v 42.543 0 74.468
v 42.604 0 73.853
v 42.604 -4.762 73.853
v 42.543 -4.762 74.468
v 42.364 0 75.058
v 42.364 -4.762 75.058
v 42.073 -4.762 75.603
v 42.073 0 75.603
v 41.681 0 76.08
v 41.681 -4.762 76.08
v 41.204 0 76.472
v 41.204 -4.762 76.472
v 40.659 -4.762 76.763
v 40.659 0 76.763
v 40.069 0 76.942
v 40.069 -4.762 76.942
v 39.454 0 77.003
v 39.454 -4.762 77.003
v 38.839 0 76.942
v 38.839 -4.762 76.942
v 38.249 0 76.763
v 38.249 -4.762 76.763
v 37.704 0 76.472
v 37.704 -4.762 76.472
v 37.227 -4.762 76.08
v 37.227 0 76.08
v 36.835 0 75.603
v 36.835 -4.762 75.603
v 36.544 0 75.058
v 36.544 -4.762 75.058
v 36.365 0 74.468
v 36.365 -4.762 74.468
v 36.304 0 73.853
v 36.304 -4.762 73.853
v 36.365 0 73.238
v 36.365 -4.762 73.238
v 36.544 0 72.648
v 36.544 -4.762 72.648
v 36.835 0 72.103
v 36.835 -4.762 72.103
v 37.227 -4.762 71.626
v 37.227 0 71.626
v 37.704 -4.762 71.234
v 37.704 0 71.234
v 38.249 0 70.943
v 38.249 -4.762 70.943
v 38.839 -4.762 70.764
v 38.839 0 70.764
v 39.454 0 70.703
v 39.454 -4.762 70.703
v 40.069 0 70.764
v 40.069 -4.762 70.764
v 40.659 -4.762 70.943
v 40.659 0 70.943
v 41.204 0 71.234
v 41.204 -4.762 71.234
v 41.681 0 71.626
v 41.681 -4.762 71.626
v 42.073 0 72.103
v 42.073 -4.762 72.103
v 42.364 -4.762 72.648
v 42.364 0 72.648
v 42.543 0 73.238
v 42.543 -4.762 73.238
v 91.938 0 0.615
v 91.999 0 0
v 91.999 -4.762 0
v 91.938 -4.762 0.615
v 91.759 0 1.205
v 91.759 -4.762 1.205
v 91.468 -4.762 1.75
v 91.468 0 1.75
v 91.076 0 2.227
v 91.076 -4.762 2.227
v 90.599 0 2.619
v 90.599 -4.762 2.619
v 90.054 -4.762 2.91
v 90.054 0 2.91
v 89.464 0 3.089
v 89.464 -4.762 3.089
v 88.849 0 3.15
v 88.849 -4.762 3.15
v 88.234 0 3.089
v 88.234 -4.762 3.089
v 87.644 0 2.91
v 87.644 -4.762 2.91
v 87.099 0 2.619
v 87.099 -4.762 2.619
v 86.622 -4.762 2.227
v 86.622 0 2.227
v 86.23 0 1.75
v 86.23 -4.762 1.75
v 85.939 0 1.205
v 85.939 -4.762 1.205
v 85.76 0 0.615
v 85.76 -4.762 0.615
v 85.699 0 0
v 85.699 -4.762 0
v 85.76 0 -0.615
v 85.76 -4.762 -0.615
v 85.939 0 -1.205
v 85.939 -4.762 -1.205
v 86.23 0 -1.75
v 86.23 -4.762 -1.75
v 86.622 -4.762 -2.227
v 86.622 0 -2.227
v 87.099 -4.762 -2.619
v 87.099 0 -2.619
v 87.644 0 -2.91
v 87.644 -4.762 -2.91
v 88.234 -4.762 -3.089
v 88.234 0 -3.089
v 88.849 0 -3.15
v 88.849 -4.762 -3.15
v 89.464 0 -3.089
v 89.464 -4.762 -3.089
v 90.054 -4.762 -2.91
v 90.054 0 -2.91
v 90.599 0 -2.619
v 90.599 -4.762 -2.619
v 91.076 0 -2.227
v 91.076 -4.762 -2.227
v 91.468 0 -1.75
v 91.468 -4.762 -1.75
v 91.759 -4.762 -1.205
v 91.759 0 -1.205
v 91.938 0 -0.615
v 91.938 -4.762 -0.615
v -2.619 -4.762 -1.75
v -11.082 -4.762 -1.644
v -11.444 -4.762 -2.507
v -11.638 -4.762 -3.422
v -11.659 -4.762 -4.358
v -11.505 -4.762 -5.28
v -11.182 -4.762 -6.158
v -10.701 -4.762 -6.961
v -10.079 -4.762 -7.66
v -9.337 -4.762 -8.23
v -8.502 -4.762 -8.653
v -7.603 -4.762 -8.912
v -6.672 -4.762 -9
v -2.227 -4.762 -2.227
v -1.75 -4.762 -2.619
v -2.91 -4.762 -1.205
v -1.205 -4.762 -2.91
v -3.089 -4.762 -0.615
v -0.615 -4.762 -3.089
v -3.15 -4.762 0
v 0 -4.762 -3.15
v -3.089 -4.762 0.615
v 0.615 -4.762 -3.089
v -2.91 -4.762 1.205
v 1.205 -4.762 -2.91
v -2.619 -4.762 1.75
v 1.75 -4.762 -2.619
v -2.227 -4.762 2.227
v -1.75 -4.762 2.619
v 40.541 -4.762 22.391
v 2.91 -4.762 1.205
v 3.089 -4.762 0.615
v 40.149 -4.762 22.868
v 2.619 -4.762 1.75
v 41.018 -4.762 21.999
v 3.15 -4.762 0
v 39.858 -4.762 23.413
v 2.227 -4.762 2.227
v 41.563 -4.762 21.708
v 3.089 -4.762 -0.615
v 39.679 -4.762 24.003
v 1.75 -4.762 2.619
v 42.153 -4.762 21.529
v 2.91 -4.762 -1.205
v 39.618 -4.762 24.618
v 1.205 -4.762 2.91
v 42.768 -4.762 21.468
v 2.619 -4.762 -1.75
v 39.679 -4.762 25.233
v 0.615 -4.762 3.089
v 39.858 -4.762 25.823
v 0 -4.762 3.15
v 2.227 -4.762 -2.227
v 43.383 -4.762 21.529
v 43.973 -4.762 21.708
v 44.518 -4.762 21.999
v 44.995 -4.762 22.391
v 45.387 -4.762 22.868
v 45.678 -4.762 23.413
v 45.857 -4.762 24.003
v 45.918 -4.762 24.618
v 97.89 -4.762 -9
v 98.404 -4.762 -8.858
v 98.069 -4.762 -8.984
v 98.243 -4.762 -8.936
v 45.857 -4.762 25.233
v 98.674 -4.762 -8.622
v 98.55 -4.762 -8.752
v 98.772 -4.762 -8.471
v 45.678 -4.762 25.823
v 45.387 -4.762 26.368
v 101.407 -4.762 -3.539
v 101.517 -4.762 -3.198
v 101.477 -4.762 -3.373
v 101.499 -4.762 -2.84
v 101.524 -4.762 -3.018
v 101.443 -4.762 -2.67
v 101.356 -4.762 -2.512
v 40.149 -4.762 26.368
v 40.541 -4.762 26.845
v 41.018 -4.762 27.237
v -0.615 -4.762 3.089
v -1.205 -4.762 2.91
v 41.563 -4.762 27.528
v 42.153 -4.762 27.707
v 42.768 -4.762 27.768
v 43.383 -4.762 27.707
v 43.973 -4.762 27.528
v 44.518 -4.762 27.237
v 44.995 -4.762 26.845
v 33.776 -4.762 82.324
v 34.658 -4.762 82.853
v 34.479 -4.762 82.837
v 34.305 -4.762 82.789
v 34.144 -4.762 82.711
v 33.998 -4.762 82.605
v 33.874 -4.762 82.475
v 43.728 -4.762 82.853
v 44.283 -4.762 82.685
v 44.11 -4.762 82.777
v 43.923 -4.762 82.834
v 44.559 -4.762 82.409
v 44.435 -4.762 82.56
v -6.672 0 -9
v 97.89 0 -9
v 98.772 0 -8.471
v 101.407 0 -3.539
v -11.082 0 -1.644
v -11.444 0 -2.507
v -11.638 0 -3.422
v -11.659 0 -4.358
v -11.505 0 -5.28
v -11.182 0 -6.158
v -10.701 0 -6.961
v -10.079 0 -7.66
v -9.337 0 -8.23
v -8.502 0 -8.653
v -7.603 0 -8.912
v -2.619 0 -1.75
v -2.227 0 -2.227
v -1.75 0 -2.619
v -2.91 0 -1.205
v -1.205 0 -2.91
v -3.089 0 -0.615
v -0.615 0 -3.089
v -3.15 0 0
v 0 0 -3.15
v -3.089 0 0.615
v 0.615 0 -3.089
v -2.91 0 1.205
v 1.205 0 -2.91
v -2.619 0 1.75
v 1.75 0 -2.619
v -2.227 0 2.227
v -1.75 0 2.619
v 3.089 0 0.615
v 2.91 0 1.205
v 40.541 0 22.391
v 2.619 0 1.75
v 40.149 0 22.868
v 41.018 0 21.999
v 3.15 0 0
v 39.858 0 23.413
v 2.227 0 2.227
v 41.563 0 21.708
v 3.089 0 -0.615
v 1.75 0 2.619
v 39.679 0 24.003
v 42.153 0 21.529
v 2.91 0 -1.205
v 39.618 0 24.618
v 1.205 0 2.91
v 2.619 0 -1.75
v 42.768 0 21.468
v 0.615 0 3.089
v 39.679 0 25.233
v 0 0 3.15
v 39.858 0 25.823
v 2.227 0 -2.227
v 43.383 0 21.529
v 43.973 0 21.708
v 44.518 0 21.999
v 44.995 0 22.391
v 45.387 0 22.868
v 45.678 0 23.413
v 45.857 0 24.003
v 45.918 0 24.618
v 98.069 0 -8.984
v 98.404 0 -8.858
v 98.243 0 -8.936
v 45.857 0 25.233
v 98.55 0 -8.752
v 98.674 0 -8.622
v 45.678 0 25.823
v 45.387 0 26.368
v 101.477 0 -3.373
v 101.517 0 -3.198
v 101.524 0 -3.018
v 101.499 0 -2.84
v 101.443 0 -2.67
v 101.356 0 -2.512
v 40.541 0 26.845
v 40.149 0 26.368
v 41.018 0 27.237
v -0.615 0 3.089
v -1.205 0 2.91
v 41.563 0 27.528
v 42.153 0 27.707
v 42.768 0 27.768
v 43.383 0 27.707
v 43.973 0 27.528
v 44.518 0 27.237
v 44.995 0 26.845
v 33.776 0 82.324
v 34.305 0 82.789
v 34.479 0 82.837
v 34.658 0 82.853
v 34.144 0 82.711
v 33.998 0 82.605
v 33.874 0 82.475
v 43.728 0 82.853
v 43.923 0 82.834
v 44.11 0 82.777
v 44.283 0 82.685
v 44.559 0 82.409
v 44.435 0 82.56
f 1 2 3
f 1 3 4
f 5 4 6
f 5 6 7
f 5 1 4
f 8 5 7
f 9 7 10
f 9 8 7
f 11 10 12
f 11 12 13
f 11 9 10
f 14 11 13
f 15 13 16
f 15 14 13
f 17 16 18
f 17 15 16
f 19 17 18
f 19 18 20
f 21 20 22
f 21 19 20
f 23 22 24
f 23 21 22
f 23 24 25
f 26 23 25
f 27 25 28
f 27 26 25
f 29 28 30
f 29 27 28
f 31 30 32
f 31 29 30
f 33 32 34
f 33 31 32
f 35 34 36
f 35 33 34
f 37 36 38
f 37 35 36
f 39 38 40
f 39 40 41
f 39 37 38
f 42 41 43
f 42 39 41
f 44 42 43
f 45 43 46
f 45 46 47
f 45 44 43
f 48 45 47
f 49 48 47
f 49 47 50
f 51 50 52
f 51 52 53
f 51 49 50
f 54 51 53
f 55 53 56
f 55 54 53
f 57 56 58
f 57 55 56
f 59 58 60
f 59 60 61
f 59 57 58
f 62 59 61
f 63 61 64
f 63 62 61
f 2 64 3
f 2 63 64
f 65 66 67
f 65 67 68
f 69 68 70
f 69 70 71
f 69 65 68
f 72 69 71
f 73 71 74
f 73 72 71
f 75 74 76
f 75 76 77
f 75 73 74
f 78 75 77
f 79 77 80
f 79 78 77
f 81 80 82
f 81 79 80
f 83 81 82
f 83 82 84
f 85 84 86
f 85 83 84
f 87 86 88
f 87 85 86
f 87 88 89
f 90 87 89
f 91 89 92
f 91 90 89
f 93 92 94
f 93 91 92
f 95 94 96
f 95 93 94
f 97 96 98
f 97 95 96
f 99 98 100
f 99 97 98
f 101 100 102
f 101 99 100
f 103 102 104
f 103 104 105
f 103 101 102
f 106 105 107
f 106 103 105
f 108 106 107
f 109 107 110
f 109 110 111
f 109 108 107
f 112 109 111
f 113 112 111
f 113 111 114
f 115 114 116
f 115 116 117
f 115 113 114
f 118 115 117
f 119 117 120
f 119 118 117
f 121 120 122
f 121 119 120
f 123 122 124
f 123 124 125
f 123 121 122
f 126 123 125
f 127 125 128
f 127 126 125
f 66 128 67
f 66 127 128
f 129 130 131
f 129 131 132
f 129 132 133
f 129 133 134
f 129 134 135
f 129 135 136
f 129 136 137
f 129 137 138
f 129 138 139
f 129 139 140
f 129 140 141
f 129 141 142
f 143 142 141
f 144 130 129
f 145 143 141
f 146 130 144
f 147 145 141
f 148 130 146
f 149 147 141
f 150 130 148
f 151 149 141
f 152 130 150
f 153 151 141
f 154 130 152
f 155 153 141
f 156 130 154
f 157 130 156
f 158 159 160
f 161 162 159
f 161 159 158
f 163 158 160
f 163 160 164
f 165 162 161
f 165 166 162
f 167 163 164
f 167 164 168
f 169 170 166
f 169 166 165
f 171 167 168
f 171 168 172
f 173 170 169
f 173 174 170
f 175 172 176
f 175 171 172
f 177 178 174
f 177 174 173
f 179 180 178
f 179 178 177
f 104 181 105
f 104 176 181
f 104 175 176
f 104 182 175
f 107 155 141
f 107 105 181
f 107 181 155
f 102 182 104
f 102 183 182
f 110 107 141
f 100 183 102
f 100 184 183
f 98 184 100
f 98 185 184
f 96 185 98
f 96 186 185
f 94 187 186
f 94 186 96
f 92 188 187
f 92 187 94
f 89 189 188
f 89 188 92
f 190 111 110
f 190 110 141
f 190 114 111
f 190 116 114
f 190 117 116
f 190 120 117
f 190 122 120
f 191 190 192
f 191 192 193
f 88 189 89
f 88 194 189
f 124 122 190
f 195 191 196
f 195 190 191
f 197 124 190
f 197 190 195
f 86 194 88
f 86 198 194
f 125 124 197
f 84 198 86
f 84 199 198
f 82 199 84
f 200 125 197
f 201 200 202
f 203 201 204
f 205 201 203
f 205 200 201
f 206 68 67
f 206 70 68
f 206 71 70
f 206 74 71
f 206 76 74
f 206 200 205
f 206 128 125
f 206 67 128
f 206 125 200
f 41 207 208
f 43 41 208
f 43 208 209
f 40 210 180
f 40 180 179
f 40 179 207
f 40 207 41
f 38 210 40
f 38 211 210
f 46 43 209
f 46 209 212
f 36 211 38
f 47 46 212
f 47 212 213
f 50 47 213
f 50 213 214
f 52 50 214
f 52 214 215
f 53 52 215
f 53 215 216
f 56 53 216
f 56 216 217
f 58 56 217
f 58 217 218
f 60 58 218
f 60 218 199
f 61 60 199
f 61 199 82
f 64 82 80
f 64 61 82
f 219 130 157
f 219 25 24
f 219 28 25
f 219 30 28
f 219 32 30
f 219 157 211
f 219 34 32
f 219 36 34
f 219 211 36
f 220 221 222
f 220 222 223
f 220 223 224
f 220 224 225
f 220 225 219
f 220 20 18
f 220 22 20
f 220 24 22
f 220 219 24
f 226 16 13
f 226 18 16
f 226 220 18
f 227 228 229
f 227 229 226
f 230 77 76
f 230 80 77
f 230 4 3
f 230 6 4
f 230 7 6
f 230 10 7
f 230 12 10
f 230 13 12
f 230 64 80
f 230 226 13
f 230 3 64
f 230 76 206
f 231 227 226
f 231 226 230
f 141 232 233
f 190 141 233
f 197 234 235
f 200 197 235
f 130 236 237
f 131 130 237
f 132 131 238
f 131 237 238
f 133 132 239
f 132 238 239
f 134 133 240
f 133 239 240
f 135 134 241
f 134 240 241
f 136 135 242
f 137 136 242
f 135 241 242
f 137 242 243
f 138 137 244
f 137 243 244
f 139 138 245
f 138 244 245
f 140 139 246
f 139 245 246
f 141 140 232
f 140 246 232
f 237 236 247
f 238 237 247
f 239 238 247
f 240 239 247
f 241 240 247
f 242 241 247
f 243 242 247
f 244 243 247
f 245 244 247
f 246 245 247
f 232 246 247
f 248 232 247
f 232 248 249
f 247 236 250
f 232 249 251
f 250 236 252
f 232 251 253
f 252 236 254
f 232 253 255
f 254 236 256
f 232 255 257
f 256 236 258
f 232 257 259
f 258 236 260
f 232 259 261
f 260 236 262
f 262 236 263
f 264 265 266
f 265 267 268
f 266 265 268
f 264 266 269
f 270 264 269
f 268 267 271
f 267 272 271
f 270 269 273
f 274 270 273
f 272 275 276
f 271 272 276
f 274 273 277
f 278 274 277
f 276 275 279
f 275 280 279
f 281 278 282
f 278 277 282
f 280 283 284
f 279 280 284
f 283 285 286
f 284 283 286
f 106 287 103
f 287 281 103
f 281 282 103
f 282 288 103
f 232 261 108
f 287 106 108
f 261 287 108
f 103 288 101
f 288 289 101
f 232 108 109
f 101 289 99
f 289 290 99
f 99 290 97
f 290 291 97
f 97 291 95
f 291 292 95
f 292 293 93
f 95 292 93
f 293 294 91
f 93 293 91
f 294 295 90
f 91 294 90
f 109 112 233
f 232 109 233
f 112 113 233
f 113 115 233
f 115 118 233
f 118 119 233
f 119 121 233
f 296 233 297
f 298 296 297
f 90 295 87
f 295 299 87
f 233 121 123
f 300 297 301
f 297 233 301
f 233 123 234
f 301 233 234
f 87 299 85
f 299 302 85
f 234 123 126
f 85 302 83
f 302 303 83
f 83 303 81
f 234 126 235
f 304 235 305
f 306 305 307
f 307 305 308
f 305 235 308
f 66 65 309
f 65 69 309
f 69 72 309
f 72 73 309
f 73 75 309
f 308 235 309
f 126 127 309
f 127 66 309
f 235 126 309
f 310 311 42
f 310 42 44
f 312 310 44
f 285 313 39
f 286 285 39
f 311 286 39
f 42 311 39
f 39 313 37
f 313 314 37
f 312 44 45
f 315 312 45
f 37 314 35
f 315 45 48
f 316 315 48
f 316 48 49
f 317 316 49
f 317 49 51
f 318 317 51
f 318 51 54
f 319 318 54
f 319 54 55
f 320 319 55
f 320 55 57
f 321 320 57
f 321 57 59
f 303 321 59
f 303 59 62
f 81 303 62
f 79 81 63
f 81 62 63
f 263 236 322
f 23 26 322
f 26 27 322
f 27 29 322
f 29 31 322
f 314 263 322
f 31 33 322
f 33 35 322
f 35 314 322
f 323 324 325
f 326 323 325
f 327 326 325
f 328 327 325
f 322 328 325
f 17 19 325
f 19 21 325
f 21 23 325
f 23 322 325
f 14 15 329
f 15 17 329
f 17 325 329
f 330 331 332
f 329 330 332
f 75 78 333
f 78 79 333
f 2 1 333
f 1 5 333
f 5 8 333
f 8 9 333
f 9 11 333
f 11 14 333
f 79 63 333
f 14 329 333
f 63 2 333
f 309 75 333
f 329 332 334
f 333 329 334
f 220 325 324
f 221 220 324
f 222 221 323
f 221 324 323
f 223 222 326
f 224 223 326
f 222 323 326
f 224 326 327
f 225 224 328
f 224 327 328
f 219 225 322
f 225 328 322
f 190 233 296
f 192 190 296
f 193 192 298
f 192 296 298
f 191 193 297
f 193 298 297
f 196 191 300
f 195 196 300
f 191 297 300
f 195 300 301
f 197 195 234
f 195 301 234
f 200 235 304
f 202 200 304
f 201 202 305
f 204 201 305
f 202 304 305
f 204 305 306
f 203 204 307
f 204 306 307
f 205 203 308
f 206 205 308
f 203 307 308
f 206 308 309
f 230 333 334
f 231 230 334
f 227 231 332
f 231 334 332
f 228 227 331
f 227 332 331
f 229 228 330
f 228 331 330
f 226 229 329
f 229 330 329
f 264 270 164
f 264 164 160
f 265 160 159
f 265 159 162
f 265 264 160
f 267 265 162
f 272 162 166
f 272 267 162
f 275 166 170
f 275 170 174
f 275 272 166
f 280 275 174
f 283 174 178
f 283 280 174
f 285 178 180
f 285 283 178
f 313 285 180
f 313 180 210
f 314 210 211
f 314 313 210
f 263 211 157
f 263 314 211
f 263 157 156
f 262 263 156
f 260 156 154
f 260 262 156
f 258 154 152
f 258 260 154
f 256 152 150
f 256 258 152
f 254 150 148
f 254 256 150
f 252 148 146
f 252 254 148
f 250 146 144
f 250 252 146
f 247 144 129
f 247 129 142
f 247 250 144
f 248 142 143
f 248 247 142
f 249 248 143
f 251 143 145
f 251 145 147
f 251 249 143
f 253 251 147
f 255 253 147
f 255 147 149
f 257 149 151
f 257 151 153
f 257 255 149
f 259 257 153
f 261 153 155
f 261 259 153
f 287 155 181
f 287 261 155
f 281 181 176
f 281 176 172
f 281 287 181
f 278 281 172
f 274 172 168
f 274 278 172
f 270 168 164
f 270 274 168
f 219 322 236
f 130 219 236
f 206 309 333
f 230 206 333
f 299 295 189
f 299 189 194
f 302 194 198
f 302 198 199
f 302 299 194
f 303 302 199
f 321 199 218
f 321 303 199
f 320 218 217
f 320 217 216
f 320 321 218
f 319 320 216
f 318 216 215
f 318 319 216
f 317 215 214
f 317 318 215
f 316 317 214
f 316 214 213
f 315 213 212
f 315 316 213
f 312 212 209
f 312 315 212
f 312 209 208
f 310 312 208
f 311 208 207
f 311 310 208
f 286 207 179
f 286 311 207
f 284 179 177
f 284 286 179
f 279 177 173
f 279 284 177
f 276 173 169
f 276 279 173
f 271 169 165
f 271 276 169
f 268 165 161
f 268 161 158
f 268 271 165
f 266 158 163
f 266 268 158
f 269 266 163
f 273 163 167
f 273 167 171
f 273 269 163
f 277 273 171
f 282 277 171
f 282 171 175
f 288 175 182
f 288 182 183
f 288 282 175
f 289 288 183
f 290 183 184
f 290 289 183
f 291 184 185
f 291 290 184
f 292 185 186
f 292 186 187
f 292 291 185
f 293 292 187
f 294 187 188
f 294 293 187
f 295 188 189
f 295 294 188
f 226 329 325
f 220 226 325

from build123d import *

# Parameters (mm, degrees)
F0_R     = 3.15
F1_DEPTH = 4.7625


with BuildPart() as f1:
    # F0 (on Front) → F1 (new body)
    with BuildSketch(Plane.XZ):
        with BuildLine():
            Line((-6.671903, -9), (97.890261, -9))
            ThreePointArc((97.890261, -9), (98.40446, -8.857671), (98.772288, -8.471199))
            Line((98.772288, -8.471199), (101.407221, -3.53893))
            ThreePointArc((101.407221, -3.53893), (101.523973, -3.018327), (101.356414, -2.511787))
            Line((101.356414, -2.511787), (44.558999, 82.408944))
            ThreePointArc((44.558999, 82.408944), (44.198978, 82.735027), (43.727779, 82.853))
            Line((43.727779, 82.853), (34.657767, 82.853))
            ThreePointArc((34.657767, 82.853), (34.143569, 82.710671), (33.775741, 82.324199))
            Line((33.775741, 82.324199), (-11.082037, -1.644003))
            ThreePointArc((-11.082037, -1.644003), (-10.960259, -6.570994), (-6.671903, -9))
        make_face()
        Circle(F0_R, mode=Mode.SUBTRACT)
        with Locations((42.768, 24.618)):
            Circle(F0_R, mode=Mode.SUBTRACT)
        with Locations((88.849, 0)):
            Circle(F0_R, mode=Mode.SUBTRACT)
        with Locations((39.454, 73.853)):
            Circle(F0_R, mode=Mode.SUBTRACT)
    extrude(amount=F1_DEPTH)


solid = f1.part
